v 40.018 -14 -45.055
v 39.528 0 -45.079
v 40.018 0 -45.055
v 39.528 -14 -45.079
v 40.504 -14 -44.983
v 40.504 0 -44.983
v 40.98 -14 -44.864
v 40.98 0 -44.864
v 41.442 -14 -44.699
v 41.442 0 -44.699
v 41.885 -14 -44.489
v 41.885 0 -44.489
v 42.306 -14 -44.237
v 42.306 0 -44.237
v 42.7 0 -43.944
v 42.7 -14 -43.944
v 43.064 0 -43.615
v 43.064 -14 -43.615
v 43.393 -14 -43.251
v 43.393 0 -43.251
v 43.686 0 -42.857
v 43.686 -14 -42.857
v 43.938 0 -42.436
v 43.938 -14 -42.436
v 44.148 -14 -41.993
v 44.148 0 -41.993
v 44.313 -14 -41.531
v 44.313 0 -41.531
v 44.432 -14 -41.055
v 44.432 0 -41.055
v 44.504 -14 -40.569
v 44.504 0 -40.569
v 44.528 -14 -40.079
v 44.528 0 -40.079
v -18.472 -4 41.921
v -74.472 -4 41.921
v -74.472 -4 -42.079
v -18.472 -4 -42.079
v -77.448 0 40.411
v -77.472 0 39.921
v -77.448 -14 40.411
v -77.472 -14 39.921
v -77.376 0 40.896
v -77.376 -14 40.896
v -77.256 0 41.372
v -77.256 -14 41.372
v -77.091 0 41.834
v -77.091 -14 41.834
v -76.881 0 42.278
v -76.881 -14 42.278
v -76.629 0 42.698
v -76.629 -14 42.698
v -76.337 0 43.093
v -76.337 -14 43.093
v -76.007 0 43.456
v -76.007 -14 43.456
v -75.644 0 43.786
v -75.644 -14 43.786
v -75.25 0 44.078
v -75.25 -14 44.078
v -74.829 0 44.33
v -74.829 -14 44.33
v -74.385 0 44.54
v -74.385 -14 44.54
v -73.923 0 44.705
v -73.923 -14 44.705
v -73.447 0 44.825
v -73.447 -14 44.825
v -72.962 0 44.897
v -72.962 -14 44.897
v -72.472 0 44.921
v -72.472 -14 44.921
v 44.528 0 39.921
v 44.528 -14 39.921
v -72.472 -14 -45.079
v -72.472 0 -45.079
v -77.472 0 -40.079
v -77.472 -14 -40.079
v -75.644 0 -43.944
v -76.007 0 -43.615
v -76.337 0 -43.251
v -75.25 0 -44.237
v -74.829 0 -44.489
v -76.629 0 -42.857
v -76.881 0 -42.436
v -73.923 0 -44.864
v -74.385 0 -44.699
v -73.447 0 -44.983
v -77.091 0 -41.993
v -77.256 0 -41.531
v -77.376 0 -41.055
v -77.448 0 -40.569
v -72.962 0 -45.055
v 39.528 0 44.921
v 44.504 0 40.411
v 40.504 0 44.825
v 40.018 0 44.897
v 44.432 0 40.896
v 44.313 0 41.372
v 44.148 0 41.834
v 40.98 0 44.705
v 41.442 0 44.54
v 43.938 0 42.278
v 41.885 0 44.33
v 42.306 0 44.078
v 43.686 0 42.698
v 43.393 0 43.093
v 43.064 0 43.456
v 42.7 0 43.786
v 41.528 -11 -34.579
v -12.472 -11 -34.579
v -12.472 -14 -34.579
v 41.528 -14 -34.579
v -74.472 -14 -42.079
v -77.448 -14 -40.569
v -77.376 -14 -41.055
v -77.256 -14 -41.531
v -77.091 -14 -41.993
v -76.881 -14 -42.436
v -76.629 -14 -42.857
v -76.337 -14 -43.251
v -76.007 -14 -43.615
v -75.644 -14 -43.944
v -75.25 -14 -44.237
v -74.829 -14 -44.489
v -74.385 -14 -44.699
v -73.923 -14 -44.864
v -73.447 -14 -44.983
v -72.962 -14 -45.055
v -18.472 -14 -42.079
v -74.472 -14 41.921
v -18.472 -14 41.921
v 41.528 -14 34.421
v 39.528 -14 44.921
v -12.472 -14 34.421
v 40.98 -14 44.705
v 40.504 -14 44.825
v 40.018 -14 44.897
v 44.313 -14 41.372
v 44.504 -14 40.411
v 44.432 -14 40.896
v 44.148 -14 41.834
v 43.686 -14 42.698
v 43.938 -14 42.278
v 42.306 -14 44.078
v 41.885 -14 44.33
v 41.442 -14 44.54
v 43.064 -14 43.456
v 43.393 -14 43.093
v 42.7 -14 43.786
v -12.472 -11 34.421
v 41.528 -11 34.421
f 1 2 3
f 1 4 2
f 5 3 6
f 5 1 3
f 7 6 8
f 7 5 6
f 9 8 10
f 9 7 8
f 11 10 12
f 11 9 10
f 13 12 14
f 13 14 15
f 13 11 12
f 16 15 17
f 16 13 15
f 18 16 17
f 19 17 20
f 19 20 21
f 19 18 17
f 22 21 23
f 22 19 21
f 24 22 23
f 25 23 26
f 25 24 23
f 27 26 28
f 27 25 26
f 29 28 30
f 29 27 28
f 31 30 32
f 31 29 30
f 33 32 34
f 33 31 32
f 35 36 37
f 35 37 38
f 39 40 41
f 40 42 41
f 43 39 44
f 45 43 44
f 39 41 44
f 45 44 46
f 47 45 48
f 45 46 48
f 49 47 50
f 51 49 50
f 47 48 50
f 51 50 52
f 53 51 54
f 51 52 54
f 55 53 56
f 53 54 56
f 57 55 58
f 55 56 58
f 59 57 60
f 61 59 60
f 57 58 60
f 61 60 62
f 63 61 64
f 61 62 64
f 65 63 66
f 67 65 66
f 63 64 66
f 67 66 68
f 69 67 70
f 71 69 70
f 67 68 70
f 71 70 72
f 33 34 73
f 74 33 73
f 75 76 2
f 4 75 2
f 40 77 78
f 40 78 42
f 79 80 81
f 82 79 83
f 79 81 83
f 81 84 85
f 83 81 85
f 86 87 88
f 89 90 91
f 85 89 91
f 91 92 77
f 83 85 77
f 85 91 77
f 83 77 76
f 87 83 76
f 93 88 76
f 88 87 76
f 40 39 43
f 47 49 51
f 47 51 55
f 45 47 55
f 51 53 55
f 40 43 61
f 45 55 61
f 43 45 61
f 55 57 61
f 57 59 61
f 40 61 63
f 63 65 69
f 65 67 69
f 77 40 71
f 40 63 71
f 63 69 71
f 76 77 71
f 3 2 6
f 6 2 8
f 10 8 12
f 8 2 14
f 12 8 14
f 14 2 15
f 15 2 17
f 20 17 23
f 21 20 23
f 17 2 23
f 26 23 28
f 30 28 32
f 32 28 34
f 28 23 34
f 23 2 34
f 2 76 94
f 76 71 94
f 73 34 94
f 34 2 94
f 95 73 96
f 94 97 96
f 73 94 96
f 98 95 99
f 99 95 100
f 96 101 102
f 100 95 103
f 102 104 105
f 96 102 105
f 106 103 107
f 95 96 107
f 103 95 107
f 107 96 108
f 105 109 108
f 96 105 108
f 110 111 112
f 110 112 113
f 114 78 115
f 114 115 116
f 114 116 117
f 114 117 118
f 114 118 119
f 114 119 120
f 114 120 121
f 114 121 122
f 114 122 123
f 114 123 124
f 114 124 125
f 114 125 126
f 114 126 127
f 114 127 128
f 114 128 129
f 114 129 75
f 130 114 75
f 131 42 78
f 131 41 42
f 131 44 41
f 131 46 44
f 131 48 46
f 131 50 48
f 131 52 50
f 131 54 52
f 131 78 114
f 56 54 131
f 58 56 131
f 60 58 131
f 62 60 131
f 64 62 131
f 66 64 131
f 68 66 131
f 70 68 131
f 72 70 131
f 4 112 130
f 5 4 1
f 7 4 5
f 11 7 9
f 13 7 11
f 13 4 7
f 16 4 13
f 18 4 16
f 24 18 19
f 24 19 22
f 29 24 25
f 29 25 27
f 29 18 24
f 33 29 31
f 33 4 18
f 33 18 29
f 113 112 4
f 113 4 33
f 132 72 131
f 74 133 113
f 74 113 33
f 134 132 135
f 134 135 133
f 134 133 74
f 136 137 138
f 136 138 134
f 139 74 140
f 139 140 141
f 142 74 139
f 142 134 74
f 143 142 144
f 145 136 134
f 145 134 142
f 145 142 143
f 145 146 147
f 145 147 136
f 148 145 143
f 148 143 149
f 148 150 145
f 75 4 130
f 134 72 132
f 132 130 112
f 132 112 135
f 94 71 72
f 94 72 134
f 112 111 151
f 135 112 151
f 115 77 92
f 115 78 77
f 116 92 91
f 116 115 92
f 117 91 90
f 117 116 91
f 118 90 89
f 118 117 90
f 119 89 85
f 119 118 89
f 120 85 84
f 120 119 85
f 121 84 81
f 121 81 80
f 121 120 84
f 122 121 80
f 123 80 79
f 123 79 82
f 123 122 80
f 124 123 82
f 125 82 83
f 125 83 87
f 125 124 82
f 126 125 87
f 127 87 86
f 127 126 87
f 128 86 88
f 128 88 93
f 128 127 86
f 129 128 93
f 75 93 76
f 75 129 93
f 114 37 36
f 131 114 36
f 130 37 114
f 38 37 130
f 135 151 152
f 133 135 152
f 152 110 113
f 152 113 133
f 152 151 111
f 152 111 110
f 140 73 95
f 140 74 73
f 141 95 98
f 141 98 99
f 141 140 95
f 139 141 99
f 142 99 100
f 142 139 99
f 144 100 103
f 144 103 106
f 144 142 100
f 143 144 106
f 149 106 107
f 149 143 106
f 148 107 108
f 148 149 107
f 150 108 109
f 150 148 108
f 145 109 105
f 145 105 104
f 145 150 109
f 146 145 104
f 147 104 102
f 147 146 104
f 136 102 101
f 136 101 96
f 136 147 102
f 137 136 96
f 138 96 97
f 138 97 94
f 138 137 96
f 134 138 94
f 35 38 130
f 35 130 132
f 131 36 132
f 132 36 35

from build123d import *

# Parameters (mm, degrees)
F0_W     = 122
F0_H     = 90
F0_W_2   = 56
F0_H_2   = 84
F0_W_3   = 54
F0_H_3   = 69
F1_DEPTH = 14
F2_DEPTH = 4
F3_DEPTH = 11
F4_R     = 5


with BuildPart() as f1:
    # F0 (on Front) → F1 (new body)
    with BuildSketch(Plane.XZ):
        with Locations((-16.471726, -0.079399)):
            Rectangle(F0_W, F0_H)
        with Locations((-46.471726, -0.079399)):
            Rectangle(F0_W_2, F0_H_2, mode=Mode.SUBTRACT)
        with Locations((14.528274, -0.079399)):
            Rectangle(F0_W_3, F0_H_3, mode=Mode.SUBTRACT)
    extrude(amount=F1_DEPTH)

    # F0 (on Front) → F2 (join)
    with BuildSketch(Plane.XZ):
        with Locations((-46.471726, -0.079399)):
            Rectangle(F0_W_2, F0_H_2)
    extrude(amount=F2_DEPTH)

    # F0 (on Front) → F3 (join)
    with BuildSketch(Plane.XZ):
        with Locations((14.528274, -0.079399)):
            Rectangle(F0_W_3, F0_H_3)
    extrude(amount=F3_DEPTH)

    # F4
    f4_edges = [f1.edges().sort_by_distance(p)[0] for p in [
        (-77.471726, -7, -45.079399),
        (44.528274, -7, -45.079399),
        (44.528274, -7, 44.920601),
        (-77.471726, -7, 44.920601),
    ]]
    fillet(f4_edges, radius=F4_R)


solid = f1.part
